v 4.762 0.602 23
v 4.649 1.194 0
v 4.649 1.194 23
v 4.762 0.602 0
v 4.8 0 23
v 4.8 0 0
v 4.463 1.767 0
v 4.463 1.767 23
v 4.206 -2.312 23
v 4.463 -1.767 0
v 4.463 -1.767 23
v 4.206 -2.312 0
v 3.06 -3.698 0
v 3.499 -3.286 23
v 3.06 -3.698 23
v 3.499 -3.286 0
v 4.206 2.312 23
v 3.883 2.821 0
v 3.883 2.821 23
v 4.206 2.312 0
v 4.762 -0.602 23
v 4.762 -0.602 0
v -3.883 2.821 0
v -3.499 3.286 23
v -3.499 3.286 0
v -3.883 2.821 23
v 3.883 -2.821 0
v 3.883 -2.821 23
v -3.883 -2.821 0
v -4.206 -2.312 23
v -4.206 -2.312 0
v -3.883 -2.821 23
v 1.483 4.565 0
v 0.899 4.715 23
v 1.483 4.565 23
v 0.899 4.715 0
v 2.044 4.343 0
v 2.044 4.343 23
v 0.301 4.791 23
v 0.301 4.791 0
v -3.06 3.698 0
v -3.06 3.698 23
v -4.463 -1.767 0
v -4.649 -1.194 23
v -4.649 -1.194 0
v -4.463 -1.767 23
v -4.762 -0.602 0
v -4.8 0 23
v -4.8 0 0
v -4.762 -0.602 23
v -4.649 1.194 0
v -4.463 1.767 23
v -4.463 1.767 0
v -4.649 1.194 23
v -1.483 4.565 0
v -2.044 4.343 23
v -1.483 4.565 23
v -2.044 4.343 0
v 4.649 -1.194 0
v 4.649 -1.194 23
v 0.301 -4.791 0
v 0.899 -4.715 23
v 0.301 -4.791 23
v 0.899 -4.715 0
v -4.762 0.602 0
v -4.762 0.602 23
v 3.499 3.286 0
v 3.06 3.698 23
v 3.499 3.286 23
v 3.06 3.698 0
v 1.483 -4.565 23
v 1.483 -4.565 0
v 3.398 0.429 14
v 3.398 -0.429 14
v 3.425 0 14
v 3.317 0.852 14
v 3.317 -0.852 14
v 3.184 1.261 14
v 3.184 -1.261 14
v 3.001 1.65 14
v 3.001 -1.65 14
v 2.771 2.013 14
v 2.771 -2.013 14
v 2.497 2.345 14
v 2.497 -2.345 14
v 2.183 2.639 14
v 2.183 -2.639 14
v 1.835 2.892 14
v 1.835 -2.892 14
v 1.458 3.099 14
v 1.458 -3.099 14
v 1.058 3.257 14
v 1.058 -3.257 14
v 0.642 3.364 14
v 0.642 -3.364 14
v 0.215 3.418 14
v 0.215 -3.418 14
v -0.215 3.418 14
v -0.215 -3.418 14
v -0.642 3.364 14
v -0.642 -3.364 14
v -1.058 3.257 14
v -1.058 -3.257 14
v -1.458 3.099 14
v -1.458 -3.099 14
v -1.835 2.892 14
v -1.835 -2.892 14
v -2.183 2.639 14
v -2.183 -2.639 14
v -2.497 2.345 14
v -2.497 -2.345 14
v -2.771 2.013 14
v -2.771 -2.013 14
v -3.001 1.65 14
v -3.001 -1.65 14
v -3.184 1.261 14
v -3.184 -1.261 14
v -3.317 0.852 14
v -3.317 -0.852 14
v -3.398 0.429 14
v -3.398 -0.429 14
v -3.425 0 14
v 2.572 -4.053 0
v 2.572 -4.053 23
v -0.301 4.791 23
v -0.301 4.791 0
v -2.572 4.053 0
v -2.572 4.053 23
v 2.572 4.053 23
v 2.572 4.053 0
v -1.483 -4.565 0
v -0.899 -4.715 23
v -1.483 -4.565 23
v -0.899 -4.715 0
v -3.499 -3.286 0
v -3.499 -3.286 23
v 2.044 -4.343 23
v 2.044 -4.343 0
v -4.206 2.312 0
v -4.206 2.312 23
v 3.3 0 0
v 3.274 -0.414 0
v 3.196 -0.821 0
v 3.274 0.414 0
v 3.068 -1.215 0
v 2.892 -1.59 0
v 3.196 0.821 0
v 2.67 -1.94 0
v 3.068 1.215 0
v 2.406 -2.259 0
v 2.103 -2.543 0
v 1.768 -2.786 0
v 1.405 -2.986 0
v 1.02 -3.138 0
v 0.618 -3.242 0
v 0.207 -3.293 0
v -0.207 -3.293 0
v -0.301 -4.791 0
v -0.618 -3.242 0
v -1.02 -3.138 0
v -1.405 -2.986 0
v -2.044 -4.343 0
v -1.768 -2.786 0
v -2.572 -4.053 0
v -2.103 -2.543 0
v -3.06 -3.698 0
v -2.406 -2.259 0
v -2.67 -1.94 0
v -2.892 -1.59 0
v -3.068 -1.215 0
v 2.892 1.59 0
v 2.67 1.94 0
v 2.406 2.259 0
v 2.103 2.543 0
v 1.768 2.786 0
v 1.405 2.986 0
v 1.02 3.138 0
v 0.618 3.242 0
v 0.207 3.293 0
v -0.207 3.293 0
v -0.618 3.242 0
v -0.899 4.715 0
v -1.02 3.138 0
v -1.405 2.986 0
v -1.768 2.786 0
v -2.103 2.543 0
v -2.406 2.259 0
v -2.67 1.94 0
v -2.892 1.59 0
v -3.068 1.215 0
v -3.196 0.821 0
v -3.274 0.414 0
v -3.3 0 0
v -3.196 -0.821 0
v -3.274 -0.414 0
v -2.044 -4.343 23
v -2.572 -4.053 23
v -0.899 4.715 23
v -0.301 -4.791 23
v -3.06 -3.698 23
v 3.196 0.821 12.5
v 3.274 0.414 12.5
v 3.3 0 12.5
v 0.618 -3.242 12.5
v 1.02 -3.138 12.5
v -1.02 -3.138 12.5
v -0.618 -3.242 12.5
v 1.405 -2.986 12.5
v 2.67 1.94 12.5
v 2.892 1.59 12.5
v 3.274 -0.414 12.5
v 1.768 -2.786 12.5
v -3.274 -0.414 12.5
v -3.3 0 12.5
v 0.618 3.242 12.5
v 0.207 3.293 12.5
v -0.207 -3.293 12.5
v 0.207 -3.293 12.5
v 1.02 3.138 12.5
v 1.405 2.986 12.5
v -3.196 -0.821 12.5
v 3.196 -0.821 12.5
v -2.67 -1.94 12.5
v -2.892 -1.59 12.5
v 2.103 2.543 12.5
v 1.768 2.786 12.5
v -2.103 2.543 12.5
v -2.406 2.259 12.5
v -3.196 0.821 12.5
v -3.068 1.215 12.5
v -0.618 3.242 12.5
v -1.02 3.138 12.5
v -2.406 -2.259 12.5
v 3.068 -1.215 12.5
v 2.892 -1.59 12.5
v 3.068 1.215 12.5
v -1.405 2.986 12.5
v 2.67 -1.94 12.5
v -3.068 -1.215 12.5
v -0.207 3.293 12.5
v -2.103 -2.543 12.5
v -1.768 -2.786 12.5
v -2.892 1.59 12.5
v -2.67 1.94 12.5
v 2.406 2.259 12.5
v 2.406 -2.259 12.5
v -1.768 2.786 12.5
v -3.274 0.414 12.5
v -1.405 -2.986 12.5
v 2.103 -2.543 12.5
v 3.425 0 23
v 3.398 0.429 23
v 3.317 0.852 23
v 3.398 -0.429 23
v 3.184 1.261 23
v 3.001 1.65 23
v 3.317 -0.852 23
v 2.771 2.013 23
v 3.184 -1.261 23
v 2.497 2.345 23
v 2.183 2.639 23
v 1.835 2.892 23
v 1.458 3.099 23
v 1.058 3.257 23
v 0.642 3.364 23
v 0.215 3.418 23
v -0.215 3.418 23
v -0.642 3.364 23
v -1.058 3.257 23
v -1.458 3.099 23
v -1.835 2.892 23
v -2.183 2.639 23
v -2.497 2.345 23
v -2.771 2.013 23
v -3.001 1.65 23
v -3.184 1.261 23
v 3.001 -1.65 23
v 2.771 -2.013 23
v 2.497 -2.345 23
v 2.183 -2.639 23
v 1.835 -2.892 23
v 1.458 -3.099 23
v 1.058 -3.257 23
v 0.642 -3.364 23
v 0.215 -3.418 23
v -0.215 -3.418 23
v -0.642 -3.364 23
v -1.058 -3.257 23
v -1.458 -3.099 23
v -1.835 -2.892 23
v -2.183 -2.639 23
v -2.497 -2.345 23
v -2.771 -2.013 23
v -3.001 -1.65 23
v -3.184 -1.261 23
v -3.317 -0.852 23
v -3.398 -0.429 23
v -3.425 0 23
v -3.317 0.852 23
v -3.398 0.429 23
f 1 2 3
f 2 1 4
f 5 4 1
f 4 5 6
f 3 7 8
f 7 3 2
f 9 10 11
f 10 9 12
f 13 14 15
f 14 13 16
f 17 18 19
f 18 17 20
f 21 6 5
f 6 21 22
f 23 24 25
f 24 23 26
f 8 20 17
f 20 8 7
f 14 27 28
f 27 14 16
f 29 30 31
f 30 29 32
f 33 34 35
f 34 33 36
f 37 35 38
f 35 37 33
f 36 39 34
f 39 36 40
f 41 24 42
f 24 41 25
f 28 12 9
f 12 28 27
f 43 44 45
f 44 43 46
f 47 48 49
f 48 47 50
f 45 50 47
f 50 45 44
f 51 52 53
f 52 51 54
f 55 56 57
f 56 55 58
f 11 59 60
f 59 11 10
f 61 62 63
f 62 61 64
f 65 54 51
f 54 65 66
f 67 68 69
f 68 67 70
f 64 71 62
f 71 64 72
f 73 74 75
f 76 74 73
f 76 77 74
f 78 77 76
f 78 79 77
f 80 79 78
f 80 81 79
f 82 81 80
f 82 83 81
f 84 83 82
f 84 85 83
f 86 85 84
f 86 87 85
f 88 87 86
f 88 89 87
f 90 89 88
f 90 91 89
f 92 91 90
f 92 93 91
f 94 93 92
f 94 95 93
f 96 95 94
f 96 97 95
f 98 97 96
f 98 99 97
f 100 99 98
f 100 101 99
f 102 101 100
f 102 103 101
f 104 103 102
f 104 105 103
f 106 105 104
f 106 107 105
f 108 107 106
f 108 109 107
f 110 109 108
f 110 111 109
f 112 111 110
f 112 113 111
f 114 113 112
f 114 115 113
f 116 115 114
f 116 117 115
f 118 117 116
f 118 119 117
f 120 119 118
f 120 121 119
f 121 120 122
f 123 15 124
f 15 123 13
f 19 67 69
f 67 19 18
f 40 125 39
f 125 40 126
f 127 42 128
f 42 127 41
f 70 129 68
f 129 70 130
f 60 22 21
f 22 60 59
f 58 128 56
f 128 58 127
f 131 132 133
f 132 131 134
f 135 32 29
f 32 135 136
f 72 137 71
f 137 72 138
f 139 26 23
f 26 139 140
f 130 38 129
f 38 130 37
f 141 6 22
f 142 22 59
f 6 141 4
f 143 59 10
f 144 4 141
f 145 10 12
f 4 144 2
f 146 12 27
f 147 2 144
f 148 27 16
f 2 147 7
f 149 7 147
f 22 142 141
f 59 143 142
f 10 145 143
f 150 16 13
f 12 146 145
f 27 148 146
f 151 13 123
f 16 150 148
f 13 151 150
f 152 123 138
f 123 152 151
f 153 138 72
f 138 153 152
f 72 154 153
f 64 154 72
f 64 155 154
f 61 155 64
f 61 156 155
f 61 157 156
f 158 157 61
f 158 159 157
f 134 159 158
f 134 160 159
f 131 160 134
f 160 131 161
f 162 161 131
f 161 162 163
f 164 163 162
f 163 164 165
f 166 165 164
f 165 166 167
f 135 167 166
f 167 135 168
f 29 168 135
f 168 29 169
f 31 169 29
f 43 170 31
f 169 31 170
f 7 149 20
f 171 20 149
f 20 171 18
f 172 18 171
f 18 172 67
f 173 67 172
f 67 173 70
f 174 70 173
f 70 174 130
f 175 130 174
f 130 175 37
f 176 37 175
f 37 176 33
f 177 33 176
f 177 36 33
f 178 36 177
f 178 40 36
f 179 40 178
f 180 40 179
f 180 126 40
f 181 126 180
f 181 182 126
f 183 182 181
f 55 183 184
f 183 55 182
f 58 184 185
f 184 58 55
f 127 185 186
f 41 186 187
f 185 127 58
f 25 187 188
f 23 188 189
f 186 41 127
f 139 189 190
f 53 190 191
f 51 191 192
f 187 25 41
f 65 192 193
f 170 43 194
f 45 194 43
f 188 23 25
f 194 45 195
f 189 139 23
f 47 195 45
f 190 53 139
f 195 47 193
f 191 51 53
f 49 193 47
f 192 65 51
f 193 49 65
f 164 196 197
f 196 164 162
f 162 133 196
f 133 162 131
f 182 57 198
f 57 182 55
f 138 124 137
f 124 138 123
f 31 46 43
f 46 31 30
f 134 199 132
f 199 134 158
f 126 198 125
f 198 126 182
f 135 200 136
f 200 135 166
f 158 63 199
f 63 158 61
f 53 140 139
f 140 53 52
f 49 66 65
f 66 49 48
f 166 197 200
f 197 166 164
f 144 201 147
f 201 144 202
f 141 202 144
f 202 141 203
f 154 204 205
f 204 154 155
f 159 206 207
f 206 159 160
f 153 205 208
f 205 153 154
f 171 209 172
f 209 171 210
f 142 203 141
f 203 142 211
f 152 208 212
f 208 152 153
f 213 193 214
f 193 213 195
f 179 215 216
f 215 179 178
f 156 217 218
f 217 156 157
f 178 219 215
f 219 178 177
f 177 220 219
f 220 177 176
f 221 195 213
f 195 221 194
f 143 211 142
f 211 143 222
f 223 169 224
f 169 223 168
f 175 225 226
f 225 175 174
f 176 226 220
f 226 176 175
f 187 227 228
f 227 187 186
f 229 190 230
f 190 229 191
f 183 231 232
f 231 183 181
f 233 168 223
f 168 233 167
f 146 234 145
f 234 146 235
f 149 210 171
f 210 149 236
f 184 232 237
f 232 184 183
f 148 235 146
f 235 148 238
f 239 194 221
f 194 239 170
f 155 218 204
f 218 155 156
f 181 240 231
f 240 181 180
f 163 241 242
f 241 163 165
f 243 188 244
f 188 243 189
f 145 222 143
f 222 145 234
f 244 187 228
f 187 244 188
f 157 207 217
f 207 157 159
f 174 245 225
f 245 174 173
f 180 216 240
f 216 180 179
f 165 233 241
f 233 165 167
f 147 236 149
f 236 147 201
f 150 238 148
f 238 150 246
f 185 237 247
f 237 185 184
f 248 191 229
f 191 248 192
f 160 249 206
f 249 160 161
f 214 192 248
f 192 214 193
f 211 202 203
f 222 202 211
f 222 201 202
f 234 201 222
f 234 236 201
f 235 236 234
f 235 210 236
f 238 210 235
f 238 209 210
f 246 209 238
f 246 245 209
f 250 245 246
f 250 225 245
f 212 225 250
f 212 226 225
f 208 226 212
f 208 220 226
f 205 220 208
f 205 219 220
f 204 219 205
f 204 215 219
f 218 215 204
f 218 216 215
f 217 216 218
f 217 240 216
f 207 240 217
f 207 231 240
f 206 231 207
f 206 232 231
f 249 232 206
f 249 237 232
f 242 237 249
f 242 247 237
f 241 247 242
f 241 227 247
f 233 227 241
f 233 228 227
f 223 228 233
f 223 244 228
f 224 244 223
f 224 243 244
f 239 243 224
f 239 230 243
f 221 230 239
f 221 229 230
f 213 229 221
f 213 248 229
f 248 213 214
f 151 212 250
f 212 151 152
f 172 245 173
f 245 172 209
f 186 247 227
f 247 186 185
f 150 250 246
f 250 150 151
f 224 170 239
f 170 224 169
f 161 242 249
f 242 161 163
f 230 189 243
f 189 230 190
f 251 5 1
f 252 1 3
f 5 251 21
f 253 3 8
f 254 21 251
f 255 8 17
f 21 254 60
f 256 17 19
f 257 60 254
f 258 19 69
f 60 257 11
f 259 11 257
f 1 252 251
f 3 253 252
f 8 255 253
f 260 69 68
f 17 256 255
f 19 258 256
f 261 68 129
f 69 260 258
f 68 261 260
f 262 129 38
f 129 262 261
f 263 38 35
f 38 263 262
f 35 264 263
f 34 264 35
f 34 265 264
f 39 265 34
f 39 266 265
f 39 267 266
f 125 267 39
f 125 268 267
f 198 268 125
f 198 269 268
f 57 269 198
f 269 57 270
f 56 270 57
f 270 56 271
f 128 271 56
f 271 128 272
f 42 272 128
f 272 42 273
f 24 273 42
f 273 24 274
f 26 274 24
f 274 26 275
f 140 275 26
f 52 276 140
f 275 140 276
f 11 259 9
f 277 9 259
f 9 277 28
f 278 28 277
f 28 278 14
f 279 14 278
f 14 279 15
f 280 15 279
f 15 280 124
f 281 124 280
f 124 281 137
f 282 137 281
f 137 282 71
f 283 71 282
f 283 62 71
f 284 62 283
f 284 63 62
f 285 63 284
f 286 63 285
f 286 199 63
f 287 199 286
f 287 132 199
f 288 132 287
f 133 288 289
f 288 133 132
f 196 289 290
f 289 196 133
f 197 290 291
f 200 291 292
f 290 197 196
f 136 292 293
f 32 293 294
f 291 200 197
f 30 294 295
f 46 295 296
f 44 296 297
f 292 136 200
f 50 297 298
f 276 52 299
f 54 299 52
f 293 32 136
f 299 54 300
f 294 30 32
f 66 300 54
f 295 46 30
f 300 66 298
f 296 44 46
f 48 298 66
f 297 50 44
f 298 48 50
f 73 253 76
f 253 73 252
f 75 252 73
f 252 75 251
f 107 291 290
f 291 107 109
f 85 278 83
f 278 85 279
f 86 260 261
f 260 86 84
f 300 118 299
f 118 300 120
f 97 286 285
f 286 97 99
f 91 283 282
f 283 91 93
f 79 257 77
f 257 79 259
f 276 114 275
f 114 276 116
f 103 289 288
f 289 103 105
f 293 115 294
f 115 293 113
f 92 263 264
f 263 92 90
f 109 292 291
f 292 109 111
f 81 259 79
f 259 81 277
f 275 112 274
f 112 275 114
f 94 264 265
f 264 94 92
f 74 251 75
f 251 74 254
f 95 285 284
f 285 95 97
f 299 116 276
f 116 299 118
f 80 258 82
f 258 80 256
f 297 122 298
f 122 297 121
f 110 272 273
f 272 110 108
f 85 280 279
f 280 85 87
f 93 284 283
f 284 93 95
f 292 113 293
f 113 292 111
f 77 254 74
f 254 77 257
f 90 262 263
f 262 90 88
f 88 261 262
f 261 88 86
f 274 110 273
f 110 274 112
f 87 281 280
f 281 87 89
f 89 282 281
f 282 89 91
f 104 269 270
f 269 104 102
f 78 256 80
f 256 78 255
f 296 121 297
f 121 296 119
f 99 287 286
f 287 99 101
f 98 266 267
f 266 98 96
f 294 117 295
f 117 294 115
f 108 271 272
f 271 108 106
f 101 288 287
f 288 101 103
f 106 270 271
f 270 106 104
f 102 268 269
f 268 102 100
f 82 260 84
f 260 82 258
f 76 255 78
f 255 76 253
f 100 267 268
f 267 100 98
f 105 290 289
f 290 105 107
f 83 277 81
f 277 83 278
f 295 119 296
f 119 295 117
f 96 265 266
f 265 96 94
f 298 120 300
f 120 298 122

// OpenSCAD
/* 
   Parametric ROD CONNECTOR - Ball joint to carbon fiber rod
   v1.0
*/

/*********************************************************************/
/*********************************************************************
Copyright (C) 2016  Alejandro Véliz Fernández

This program is free software: you can redistribute it and/or modify
it under the terms of the GNU General Public License as published by
the Free Software Foundation, either version 3 of the License, or
(at your option) any later version.

This program is distributed in the hope that it will be useful,
but WITHOUT ANY WARRANTY; without even the implied warranty of
MERCHANTABILITY or FITNESS FOR A PARTICULAR PURPOSE.  See the
GNU General Public License for more details.

You should have received a copy of the GNU General Public License
along with this program.  If not, see <http://www.gnu.org/licenses/>.
*********************************************************************/
/********************************************************************/

/* Configuration params */
// Rod diameter
Rodiam = 6.2;
// Rod length (rod length that goes into the part)
Rodlen = 12.5;
// End Rod diameter
EndRodiam = 6.45;
// End Rod length (end rod length that goes into the part)
EndRodlen = 9;
// Print tolerance
tolerance = 0.4;
// Wall thickness
walls = 3;
// Solid separator length
solidlen = 1.5;
/* [Hidden] */
$fn=50;


/* Connector code */
union(){
    // Rod part
    difference(){
        cylinder(r=(Rodiam+tolerance+walls)/2, h=Rodlen+solidlen);
        translate([0,0,-2])cylinder(r=(Rodiam+tolerance)/2, h=Rodlen+2);
    }
    // End Rod
    translate([0,0,Rodlen+solidlen]){
        difference(){
            cylinder(r=(Rodiam+tolerance+walls)/2, h=EndRodlen);
            cylinder(r=(EndRodiam+tolerance)/2, h=EndRodlen+2);
        }
    }
}
